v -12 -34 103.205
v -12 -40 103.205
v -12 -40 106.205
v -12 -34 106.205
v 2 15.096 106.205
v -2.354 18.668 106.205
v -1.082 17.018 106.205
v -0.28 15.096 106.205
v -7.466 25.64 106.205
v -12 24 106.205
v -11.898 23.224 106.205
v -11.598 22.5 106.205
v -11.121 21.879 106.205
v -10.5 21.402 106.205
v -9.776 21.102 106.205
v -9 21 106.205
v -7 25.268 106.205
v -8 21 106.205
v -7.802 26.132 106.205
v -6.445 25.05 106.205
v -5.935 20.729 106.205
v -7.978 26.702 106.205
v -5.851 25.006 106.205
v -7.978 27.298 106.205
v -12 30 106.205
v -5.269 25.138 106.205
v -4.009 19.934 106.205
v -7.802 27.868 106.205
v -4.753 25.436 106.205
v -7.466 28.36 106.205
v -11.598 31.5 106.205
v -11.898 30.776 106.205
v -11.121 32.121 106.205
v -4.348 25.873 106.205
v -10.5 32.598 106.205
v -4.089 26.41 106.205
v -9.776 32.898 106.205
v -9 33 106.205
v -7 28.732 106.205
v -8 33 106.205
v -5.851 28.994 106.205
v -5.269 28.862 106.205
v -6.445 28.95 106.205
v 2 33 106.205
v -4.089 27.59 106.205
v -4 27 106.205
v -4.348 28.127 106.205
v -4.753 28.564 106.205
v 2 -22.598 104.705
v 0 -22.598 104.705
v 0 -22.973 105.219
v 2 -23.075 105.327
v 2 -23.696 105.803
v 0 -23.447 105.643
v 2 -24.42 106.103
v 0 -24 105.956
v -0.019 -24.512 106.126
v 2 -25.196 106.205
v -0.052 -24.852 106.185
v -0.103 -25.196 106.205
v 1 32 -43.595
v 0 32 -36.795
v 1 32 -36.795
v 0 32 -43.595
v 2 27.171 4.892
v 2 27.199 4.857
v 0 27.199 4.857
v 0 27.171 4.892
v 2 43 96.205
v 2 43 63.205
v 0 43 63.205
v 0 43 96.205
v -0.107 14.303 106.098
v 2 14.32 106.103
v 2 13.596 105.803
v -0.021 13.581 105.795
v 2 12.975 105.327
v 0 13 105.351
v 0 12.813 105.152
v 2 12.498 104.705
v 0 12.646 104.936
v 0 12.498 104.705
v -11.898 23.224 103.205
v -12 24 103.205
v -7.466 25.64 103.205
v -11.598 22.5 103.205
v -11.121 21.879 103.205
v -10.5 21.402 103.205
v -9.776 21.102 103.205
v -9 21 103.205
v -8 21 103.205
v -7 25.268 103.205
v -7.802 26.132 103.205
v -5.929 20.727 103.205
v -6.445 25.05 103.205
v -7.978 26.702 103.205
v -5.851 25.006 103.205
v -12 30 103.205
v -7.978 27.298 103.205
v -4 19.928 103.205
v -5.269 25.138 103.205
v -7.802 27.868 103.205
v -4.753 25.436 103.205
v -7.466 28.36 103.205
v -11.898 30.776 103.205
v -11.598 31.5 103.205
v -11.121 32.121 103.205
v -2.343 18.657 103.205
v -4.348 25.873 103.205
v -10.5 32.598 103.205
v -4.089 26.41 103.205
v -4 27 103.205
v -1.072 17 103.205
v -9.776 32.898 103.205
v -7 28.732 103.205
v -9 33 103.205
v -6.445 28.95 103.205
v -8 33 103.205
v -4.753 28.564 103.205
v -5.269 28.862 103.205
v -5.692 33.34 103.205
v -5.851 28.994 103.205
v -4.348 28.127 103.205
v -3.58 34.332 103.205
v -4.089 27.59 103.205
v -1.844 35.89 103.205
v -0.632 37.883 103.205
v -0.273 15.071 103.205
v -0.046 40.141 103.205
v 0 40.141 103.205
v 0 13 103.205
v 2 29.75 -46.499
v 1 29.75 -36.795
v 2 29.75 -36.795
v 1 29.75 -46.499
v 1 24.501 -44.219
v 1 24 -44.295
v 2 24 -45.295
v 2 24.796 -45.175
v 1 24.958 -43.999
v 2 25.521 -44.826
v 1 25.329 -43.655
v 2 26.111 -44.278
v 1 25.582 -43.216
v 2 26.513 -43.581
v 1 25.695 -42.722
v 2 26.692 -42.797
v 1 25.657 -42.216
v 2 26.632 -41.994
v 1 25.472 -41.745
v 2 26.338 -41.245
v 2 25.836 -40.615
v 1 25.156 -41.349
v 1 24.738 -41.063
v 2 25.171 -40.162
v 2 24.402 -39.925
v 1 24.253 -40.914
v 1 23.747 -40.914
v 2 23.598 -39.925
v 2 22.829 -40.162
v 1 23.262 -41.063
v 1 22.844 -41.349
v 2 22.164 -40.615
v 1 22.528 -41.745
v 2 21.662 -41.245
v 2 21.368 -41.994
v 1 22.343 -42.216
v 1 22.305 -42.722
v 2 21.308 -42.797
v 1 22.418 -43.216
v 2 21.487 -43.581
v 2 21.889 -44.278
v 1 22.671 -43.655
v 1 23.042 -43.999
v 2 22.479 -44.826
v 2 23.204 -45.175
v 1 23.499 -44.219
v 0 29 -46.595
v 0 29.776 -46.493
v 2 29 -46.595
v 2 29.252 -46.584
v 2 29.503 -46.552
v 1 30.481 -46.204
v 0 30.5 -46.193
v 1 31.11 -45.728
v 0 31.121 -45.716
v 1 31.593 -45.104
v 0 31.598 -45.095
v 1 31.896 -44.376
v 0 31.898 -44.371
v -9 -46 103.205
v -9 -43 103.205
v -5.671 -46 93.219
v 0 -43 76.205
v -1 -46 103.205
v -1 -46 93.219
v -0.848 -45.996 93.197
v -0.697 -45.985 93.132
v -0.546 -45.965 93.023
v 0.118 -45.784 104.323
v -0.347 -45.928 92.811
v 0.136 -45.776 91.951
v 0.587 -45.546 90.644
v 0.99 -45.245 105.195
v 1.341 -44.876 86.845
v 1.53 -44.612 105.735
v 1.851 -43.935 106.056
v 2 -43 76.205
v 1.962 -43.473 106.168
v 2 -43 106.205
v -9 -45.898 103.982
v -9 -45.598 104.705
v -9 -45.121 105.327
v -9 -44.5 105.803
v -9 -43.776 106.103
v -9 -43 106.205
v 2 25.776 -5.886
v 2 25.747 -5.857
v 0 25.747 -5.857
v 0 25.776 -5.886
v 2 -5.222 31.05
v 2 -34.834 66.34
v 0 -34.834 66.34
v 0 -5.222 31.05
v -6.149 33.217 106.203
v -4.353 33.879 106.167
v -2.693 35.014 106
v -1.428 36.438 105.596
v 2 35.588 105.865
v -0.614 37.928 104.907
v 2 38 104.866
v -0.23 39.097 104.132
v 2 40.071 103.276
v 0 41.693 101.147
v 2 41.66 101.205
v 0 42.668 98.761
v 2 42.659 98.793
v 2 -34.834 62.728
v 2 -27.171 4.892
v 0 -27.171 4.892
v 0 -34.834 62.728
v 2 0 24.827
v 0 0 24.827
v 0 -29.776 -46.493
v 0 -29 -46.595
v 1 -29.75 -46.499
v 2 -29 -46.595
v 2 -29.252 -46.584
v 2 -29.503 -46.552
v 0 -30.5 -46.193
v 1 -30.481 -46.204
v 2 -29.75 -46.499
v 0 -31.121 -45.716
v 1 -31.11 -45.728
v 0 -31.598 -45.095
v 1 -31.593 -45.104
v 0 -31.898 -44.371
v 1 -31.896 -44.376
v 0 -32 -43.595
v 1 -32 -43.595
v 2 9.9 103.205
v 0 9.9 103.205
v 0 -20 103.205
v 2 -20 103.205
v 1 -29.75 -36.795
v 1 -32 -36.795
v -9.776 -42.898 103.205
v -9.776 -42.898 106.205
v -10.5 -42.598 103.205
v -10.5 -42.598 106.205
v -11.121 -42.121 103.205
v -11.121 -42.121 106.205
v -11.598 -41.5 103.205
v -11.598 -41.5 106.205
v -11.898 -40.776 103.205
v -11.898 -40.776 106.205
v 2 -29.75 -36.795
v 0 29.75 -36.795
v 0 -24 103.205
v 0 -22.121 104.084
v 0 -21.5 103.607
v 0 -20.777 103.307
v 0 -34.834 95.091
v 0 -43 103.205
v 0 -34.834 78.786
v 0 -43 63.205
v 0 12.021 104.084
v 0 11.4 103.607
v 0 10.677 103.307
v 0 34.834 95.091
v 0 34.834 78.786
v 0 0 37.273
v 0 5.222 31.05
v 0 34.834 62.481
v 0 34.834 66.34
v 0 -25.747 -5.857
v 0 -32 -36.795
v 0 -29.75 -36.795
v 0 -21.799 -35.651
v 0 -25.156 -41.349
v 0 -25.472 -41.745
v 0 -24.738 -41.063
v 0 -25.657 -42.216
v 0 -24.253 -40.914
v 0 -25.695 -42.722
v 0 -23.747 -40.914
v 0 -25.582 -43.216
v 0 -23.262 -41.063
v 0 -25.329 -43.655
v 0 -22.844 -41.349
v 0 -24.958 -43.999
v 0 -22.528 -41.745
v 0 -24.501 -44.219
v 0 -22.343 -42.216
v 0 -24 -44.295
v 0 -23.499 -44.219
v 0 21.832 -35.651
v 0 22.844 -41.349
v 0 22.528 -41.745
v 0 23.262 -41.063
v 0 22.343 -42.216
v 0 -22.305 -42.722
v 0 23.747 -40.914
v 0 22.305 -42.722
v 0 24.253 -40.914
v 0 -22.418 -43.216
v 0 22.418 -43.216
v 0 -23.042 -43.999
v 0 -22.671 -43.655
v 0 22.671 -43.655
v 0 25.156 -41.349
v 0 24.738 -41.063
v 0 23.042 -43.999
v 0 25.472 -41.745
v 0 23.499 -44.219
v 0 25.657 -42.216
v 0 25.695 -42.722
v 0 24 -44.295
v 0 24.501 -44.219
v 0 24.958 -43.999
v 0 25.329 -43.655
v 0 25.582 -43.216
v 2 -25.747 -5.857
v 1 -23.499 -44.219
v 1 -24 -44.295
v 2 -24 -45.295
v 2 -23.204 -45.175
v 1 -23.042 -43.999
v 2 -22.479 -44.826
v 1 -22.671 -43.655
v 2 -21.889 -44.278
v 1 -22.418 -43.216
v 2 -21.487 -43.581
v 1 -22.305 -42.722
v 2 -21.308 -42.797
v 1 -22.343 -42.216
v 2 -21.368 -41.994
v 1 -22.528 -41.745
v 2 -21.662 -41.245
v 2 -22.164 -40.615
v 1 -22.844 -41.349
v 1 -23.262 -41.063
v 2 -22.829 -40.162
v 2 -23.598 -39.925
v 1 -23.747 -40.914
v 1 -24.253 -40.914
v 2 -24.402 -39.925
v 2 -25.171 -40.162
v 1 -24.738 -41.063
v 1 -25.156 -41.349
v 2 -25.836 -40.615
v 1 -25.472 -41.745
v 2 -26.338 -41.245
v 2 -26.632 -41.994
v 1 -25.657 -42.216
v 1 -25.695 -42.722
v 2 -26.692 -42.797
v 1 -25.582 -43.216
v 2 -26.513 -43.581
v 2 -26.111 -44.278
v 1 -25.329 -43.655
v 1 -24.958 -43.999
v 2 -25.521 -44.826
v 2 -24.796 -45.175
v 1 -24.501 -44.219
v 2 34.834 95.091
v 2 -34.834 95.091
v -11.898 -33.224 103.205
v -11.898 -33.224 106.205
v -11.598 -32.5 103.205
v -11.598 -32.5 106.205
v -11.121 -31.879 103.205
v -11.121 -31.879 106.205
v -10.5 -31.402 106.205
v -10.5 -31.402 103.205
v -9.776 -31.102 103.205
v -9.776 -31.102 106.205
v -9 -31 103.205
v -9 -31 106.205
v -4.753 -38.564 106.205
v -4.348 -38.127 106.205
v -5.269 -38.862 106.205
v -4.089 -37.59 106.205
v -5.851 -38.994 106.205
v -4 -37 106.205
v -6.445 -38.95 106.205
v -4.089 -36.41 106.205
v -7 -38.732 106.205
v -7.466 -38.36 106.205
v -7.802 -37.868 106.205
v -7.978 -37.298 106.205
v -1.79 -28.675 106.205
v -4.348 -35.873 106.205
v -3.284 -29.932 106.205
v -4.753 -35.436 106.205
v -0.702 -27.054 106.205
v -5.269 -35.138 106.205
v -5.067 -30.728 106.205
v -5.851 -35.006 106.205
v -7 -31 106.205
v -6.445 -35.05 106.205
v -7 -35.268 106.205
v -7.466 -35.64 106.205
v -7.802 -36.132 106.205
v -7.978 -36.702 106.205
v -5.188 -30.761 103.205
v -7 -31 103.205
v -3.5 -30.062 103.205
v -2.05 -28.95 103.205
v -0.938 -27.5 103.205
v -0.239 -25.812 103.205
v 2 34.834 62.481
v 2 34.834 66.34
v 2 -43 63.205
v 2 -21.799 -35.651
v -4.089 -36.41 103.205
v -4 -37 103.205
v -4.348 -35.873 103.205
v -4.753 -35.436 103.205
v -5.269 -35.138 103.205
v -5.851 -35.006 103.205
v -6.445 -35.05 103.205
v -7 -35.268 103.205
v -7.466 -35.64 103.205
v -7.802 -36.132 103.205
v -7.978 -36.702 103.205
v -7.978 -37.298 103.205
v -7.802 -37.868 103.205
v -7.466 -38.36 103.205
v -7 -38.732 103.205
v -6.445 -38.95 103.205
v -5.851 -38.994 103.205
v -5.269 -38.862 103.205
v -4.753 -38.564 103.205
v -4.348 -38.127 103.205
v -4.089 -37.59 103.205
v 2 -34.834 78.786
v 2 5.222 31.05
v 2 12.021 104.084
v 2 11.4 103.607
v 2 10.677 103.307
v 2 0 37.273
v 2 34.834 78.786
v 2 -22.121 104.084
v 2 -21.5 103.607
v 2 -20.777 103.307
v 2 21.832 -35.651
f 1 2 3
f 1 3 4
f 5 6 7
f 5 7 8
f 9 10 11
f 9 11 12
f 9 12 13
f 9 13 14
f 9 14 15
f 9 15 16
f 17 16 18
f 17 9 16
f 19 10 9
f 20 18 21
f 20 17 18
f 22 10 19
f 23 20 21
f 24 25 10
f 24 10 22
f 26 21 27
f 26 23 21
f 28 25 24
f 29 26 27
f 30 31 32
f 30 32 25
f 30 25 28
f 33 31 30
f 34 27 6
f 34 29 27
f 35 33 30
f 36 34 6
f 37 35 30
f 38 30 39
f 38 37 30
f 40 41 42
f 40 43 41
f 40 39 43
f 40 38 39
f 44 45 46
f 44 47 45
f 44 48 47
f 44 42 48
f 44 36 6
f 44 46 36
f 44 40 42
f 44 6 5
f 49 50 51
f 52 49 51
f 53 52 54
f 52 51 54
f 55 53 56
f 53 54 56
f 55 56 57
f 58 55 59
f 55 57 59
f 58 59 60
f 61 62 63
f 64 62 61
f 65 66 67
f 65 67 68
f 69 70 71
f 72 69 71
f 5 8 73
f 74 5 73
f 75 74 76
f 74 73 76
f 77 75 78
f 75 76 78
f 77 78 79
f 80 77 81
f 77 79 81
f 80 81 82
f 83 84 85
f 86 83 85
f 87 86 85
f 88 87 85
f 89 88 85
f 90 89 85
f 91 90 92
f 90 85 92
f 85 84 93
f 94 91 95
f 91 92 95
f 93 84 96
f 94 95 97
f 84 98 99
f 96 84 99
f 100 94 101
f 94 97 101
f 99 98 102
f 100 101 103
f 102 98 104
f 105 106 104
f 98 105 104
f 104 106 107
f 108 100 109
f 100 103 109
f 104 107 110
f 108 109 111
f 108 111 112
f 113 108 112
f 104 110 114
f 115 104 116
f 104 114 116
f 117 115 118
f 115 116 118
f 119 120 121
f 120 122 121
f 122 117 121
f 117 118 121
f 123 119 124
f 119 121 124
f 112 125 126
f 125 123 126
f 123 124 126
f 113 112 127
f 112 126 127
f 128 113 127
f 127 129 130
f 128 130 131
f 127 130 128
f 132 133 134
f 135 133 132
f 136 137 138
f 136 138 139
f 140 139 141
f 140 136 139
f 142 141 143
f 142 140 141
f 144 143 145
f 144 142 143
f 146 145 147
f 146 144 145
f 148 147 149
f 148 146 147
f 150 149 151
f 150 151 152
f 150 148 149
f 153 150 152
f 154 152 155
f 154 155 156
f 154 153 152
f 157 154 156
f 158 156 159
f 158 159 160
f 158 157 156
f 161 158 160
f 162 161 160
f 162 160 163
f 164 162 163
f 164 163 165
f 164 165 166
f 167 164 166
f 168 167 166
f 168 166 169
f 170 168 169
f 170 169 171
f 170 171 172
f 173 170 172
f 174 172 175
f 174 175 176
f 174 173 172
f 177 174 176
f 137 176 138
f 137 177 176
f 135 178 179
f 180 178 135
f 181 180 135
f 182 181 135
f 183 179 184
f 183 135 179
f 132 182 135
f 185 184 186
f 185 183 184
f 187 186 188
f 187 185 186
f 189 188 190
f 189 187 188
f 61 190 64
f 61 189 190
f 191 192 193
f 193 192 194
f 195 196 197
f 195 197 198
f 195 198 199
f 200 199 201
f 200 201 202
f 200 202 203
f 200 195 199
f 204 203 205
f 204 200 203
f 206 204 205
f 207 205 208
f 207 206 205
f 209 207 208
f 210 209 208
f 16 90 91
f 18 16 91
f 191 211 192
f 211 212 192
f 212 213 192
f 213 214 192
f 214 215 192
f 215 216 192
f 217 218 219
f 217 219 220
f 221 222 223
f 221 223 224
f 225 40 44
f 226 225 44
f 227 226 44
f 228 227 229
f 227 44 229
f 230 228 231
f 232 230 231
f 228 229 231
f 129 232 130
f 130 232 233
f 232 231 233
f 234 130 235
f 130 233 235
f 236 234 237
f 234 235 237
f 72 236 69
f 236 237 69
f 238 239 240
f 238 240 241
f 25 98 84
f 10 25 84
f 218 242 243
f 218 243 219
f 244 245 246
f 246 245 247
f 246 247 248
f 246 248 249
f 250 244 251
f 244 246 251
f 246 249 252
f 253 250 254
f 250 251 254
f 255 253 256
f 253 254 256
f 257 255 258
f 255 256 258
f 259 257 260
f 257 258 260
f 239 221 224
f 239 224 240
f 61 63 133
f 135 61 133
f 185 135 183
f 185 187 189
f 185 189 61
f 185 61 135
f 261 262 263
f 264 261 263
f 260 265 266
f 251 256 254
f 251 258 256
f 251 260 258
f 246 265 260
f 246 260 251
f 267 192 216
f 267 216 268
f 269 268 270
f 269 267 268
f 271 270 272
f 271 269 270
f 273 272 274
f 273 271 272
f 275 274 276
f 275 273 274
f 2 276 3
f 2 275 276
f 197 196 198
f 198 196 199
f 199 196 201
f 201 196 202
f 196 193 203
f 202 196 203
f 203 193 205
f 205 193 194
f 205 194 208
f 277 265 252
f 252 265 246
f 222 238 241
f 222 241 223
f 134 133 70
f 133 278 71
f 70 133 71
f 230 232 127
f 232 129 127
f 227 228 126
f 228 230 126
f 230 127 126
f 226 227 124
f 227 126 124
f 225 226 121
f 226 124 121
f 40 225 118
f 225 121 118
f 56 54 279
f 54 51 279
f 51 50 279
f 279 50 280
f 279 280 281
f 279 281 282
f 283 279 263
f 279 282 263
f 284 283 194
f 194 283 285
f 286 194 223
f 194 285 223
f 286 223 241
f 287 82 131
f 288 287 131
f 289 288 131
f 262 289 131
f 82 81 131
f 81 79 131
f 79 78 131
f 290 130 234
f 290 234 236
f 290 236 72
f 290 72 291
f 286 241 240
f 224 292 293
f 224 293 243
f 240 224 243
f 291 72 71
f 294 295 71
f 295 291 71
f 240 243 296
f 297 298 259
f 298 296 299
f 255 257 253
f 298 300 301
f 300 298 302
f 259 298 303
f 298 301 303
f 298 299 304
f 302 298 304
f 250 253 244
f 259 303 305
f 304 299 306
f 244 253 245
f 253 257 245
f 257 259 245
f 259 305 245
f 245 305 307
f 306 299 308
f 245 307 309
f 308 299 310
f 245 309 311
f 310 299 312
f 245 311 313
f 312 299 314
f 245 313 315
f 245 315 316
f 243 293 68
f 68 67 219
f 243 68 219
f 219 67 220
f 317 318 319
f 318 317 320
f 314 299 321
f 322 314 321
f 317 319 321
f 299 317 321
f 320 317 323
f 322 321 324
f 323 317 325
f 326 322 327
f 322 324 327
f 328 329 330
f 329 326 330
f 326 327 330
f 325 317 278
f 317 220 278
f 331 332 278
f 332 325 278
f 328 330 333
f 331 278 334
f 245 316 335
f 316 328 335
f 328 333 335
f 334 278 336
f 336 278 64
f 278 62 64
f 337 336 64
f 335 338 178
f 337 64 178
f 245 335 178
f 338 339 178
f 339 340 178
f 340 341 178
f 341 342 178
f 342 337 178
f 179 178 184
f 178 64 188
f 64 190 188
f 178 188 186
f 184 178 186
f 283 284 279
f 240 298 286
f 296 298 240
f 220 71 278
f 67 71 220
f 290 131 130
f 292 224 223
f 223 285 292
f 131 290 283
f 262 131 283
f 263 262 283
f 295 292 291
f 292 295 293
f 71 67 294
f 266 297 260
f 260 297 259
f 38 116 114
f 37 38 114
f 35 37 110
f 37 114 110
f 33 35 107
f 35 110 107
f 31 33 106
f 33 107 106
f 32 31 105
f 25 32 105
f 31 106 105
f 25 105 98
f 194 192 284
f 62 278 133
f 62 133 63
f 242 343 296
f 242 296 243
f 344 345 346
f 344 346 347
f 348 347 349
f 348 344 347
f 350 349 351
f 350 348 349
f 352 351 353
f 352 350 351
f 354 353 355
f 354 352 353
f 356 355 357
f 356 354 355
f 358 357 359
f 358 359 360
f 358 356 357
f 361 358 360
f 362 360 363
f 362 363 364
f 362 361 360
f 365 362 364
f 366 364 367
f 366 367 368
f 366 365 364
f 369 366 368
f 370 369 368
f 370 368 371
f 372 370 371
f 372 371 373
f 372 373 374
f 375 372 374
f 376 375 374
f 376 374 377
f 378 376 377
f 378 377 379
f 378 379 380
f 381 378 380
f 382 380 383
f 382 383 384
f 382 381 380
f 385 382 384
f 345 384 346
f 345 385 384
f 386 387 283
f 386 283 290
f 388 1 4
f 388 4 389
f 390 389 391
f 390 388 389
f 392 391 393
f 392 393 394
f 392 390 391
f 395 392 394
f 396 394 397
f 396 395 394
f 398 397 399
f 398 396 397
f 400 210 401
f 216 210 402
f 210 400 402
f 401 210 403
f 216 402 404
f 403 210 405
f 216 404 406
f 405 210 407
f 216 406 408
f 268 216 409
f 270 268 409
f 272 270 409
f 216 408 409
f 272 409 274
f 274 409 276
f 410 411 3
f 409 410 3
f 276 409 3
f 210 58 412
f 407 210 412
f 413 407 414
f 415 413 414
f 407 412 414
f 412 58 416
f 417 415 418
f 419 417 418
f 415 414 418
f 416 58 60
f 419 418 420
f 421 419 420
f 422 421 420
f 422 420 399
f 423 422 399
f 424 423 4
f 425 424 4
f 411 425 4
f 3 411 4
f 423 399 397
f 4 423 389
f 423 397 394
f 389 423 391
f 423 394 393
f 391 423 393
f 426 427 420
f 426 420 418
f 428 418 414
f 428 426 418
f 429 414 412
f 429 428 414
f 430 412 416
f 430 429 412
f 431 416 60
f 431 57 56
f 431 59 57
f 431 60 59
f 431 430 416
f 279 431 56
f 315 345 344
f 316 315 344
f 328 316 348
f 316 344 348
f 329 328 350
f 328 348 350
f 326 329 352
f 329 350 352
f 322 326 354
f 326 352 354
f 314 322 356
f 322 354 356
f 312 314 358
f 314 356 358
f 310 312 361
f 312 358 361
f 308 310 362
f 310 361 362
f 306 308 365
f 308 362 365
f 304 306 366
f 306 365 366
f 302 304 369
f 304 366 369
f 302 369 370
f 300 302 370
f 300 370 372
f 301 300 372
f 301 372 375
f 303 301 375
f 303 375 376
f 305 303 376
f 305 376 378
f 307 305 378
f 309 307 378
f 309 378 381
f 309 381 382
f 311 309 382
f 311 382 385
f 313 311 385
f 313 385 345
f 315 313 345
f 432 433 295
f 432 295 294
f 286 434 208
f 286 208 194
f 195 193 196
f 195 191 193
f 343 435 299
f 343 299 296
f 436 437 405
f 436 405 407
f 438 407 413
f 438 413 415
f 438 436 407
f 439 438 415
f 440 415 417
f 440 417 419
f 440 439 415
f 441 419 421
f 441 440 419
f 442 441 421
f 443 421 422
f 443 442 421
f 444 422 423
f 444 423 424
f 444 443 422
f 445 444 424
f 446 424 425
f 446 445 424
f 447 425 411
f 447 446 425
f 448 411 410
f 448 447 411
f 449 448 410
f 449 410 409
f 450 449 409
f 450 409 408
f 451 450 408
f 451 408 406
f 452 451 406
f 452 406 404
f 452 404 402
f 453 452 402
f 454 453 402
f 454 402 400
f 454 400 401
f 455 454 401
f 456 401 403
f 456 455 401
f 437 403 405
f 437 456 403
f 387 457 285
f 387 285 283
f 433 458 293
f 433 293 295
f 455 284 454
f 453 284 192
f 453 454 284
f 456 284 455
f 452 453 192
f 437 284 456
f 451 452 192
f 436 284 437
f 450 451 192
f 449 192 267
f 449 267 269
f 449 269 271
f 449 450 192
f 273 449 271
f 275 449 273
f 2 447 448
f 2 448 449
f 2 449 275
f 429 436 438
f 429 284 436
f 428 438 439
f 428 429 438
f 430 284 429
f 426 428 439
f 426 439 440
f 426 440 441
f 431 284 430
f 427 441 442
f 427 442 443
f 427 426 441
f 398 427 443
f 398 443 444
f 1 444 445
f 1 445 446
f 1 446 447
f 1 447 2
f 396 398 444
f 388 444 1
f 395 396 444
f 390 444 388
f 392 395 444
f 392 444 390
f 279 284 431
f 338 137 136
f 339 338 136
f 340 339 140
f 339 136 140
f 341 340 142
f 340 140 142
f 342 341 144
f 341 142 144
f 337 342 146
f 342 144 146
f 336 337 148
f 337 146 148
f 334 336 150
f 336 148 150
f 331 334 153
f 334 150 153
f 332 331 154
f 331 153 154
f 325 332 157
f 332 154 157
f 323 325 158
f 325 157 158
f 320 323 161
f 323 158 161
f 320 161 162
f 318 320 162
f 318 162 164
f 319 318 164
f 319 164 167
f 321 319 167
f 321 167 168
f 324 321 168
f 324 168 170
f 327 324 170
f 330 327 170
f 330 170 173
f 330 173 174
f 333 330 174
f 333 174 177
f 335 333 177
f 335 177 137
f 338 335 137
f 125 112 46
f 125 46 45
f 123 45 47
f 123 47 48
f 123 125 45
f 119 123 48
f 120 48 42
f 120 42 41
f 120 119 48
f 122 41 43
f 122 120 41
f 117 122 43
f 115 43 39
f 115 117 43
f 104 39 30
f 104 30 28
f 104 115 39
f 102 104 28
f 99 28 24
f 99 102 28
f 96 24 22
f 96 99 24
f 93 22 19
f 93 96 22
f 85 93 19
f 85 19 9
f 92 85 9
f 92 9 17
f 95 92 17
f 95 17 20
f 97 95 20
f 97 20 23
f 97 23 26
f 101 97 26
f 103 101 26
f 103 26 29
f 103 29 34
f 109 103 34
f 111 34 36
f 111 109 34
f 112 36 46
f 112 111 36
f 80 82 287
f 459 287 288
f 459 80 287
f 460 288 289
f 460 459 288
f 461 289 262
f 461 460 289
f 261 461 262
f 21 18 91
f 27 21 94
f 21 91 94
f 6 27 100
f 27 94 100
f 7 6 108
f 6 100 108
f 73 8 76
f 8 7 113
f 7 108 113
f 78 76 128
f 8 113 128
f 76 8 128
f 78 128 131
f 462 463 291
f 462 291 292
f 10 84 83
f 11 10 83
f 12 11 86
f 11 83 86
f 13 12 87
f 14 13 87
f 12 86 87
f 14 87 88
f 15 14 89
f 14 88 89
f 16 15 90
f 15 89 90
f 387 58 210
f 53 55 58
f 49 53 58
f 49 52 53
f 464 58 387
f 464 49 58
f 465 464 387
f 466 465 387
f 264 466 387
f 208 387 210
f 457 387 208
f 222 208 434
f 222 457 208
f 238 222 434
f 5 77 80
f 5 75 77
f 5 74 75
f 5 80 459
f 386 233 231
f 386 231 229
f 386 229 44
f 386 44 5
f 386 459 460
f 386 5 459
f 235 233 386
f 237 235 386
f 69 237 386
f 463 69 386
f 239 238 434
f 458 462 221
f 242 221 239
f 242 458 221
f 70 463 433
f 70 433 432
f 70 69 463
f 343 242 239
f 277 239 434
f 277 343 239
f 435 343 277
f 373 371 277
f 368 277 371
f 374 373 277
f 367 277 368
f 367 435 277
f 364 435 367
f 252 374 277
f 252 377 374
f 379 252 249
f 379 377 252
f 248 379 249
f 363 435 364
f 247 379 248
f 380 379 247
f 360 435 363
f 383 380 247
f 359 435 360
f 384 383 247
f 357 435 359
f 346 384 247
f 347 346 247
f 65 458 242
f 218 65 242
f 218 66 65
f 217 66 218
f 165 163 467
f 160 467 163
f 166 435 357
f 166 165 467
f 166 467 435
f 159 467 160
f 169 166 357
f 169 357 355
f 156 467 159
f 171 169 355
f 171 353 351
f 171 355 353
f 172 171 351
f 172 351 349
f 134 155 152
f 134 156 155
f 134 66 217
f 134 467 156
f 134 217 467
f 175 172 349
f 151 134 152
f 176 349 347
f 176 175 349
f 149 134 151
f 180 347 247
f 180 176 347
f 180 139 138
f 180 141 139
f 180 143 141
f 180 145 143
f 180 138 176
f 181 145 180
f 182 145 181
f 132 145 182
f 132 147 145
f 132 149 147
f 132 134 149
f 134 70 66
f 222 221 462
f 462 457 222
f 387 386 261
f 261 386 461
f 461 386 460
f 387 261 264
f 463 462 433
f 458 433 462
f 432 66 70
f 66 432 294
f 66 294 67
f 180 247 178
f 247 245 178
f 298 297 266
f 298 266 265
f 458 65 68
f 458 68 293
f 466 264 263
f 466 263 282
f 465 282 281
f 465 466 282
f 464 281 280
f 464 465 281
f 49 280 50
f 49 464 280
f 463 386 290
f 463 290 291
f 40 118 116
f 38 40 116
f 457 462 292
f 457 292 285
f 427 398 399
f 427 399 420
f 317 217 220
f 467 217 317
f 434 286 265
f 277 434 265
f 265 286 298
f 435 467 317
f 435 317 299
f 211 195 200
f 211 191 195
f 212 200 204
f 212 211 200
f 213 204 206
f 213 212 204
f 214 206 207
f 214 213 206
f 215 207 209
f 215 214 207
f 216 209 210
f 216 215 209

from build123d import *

# Parameters (mm, degrees)
SKETCH1_W           = 9.8
SKETCH1_H           = 59.5
BOSS_EXTRUDE1_DEPTH = 2
SKETCH2_W           = 9.8
SKETCH2_H           = 64
BOSS_EXTRUDE2_DEPTH = 1
FILLET1_R           = 3
BOSS_EXTRUDE3_DEPTH = 2
SKETCH4_R           = 2
BOSS_EXTRUDE4_DEPTH = 3
FILLET2_R           = 3
FILLET3_R           = 3
SKETCH5_R           = 2
BOSS_EXTRUDE5_DEPTH = 3
FILLET4_R           = 10
FILLET6_R           = 3
FILLET7_R           = 3
BOSS_EXTRUDE6_DEPTH = 3
CHAMFER1_SIZE2      = 3
CHAMFER1_SIZE       = 17.013845459
FILLET10_R          = 3
CUT_EXTRUDE1_DEPTH  = 117.582838676
BOSS_EXTRUDE7_DEPTH = 2
SKETCH9_R           = 1.7
CUT_EXTRUDE2_DEPTH  = 117.582838676
CHAMFER2_SIZE       = 1


# Some blends are built 0.0001 mm under size
with BuildPart() as part:
    # Sketch1 → Boss-Extrude1 (new body)
    with BuildSketch(Plane(origin=(0, 0, 0), x_dir=(0, 0, -1), z_dir=(1, 0, 0))):
        with Locations((41.694735288, 0)):
            Rectangle(SKETCH1_W, SKETCH1_H)
    extrude(amount=BOSS_EXTRUDE1_DEPTH)

    # Sketch2 → Boss-Extrude2 (add)
    with BuildSketch(Plane(origin=(0, 0, 0), x_dir=(0, 0, -1), z_dir=(1, 0, 0))):
        with Locations((41.694735288, 0)):
            Rectangle(SKETCH2_W, SKETCH2_H)
    extrude(amount=BOSS_EXTRUDE2_DEPTH)

    # Fillet1
    fillet1_edges = [part.edges().sort_by_distance(p)[0] for p in [
        (0.5, -32, -46.594735288),
        (0.5, 32, -46.594735288),
    ]]
    fillet(fillet1_edges, radius=FILLET1_R)

    # Sketch3 → Boss-Extrude3 (add)
    with BuildSketch(Plane(origin=(0, 0, 0), x_dir=(0, 0, -1), z_dir=(1, 0, 0))):
        Polygon((36.794735288, 29.75), (-63.205264712, 43), (-103.205264712, 43), (-103.205264712, -43), (-63.205264712, -43), (36.794735288, -29.75), align=None)
    extrude(amount=BOSS_EXTRUDE3_DEPTH)

    # Sketch4 → Boss-Extrude4 (add)
    with BuildSketch(Plane.XY.offset(103.205264712)):
        with BuildLine():
            Line((2, -43), (-9, -43))
            ThreePointArc((-9, -43), (-11.121320344, -42.121320344), (-12, -40))
            Line((-12, -40), (-12, -34))
            ThreePointArc((-12, -34), (-11.121320344, -31.878679656), (-9, -31))
            Line((-9, -31), (-7, -31))
            ThreePointArc((-7, -31), (-2.050252532, -28.949747468), (0, -24))
            Line((0, -24), (0, -23))
            Line((0, -23), (2, -23))
            Line((2, -23), (2, -31))
            Line((2, -31), (2, -43))
        make_face()
        with Locations((-6, -37)):
            Circle(SKETCH4_R, mode=Mode.SUBTRACT)
    extrude(amount=BOSS_EXTRUDE4_DEPTH)

    # Fillet2
    fillet2_edges = [part.edges().sort_by_distance(p)[0] for p in [
        (1, -23, 103.205264712),
    ]]
    fillet(fillet2_edges, radius=FILLET2_R - 0.0001)  # a hair under: the kernel refuses the full size

    # Fillet3
    # the kernel refuses this fillet: 3 mm, written as the material it takes off along each edge
    with BuildSketch(Plane(origin=(-5.490486718, -23, 106.205264712), x_dir=(0, 0.2587982993664488, -0.9659313848535175), z_dir=(1, 0, 0))) as fillet3_piece_1:
        with BuildLine():
            CenterArc((2.329422704, -2.897768274), FILLET3_R, 105.000679234, 60.000551337)
            Line((-0.56837145, -2.121373376), (-0.858150866, -2.043733886))
            Line((-0.858150866, -2.043733886), (-0.289779415, 0.07763949))
            Line((-0.289779415, 0.07763949), (0.07763949, 0.289779415))
            ThreePointArc((0.07763949, 0.289779415), (0.077736083, 0.289753536), (1.475282068, 0.289776827))
            Line((1.475282068, 0.289776827), (1.552931216, 0))
        make_face()
    extrude(amount=12.980973437, mode=Mode.SUBTRACT)

    # Sketch5 → Boss-Extrude5 (add)
    with BuildSketch(Plane.XY.offset(103.205264712)):
        with BuildLine():
            Line((-8, 33), (-9, 33))
            ThreePointArc((-9, 33), (-11.121320344, 32.121320344), (-12, 30))
            Line((-12, 30), (-12, 24))
            ThreePointArc((-12, 24), (-11.121320344, 21.878679656), (-9, 21))
            Line((-9, 21), (-8, 21))
            ThreePointArc((-8, 21), (-2.343145751, 18.656854249), (0, 13))
            Line((0, 13), (0, 12.9))
            Line((0, 12.9), (2, 12.9))
            Line((2, 12.9), (2, 21))
            Line((2, 21), (2, 33))
            Line((2, 33), (2, 43))
            Line((2, 43), (0, 43))
            Line((0, 43), (0, 41))
            ThreePointArc((0, 41), (-2.343145751, 35.343145751), (-8, 33))
        make_face()
        with Locations((-6, 27)):
            Circle(SKETCH5_R, mode=Mode.SUBTRACT)
    extrude(amount=BOSS_EXTRUDE5_DEPTH)

    # Fillet4
    # the kernel refuses this fillet: 10 mm, written as the material it takes off along each edge
    with BuildSketch(Plane(origin=(27, 43, 106.205264712), x_dir=(0, 0, -1), z_dir=(-1, 0, 0))) as fillet4_piece_1:
        with BuildLine():
            CenterArc((FILLET4_R, FILLET4_R), FILLET4_R, 180, 90)
            Line((0, FILLET4_R), (0, 0))
            Line((0, 0), (FILLET4_R, 0))
        make_face()
    extrude(amount=52, mode=Mode.SUBTRACT)

    # Fillet6
    fillet6_edges = [part.edges().sort_by_distance(p)[0] for p in [
        (1, 12.9, 103.205264712),
    ]]
    fillet(fillet6_edges, radius=FILLET6_R - 0.0001)  # a hair under: the kernel refuses the full size

    # Fillet7
    # the kernel refuses this fillet: 3 mm, written as the material it takes off along each edge
    with BuildSketch(Plane(origin=(-5.490486718, 12.9, 106.205264712), x_dir=(0, -0.2587982993664468, -0.9659313848535179), z_dir=(1, 0, 0))) as fillet7_piece_1:
        with BuildLine():
            CenterArc((2.329422704, 2.897768274), FILLET7_R, 194.99876943, 60.000551337)
            Line((-0.56837145, 2.121373376), (-0.858150866, 2.043733886))
            Line((-0.858150866, 2.043733886), (-0.289779415, -0.07763949))
            Line((-0.289779415, -0.07763949), (0.07763949, -0.289779415))
            ThreePointArc((0.07763949, -0.289779415), (0.077736083, -0.289753536), (1.475282068, -0.289776827))
            Line((1.475282068, -0.289776827), (1.552931216, 0))
        make_face()
    extrude(amount=12.980973437, mode=Mode.SUBTRACT)

    # Sketch6 → Boss-Extrude6 (add)
    with BuildSketch(Plane.XZ.offset(43)):
        Polygon((2, 106.205264712), (-9, 106.205264712), (-9, 103.205264712), (0, 76.205264712), (2, 76.205264712), align=None)
    extrude(amount=BOSS_EXTRUDE6_DEPTH)

    # Chamfer1
    chamfer1_edges = [part.edges().sort_by_distance(p)[0] for p in [
        (1, -46, 76.205264712),
    ]]
    chamfer1_side = [part.faces().sort_by_distance(p)[0] for p in [
        (1, -46, 76.265264712),
    ]]
    chamfer(chamfer1_edges, length=CHAMFER1_SIZE - 0.0001, length2=CHAMFER1_SIZE2 - 0.0001, reference=chamfer1_side[0])  # a hair under: the kernel refuses the full size

    # Fillet10
    fillet10_edges = [part.edges().sort_by_distance(p)[0] for p in [
        (2, -46, 99.712137442),
        (-3.5, -46, 106.205264712),
    ]]
    fillet(fillet10_edges, radius=FILLET10_R)

    # Sketch7 → Cut-Extrude1 (cut, through all)
    with BuildSketch(Plane(origin=(2, 0, 0), x_dir=(0, 0, -1), z_dir=(1, 0, 0))):
        Polygon((35.650666719, 21.831669631), (35.650666719, -21.798973174), (-62.72810878, -34.834160927), (-95.091144317, -34.834160927), (-95.091144317, 34.834160927), (-62.481343063, 34.834160927), align=None)
    extrude(amount=-CUT_EXTRUDE1_DEPTH, mode=Mode.SUBTRACT)

    # Sketch8 → Boss-Extrude7 (add)
    with BuildSketch(Plane(origin=(2, 0, 0), x_dir=(0, 0, -1), z_dir=(1, 0, 0))):
        Polygon((-78.78624369, 34.834160927), (-37.27250726, 0), (-78.78624369, -34.834160927), (-66.340453075, -34.834160927), (-31.049611953, -5.221629157), (-4.891583353, -27.170821308), (-1.562241162, -29.964471113), (8.678277132, -28.114027922), (5.856936901, -25.746642374), (-24.826716646, 0), (5.856936901, 25.746642374), (7.77511163, 27.665346604), (-2.902361224, 28.796551739), (-4.891583353, 27.170821308), (-31.049611953, 5.221629157), (-66.340453075, 34.834160927), align=None)
    extrude(amount=-BOSS_EXTRUDE7_DEPTH)

    # Sketch9 → Cut-Extrude2 (cut, through all)
    with BuildSketch(Plane(origin=(2, 0, 0), x_dir=(0, 0, -1), z_dir=(1, 0, 0))):
        with Locations((42.594735288, 24)):
            Circle(SKETCH9_R)
        with Locations((42.594735288, -24)):
            Circle(SKETCH9_R)
    extrude(amount=-CUT_EXTRUDE2_DEPTH, mode=Mode.SUBTRACT)

    # Chamfer2
    chamfer2_edges = [part.edges().sort_by_distance(p)[0] for p in [
        (2, 24, -40.894735288),
        (2, -24, -40.894735288),
    ]]
    chamfer(chamfer2_edges, length=CHAMFER2_SIZE)


solid = part.part
